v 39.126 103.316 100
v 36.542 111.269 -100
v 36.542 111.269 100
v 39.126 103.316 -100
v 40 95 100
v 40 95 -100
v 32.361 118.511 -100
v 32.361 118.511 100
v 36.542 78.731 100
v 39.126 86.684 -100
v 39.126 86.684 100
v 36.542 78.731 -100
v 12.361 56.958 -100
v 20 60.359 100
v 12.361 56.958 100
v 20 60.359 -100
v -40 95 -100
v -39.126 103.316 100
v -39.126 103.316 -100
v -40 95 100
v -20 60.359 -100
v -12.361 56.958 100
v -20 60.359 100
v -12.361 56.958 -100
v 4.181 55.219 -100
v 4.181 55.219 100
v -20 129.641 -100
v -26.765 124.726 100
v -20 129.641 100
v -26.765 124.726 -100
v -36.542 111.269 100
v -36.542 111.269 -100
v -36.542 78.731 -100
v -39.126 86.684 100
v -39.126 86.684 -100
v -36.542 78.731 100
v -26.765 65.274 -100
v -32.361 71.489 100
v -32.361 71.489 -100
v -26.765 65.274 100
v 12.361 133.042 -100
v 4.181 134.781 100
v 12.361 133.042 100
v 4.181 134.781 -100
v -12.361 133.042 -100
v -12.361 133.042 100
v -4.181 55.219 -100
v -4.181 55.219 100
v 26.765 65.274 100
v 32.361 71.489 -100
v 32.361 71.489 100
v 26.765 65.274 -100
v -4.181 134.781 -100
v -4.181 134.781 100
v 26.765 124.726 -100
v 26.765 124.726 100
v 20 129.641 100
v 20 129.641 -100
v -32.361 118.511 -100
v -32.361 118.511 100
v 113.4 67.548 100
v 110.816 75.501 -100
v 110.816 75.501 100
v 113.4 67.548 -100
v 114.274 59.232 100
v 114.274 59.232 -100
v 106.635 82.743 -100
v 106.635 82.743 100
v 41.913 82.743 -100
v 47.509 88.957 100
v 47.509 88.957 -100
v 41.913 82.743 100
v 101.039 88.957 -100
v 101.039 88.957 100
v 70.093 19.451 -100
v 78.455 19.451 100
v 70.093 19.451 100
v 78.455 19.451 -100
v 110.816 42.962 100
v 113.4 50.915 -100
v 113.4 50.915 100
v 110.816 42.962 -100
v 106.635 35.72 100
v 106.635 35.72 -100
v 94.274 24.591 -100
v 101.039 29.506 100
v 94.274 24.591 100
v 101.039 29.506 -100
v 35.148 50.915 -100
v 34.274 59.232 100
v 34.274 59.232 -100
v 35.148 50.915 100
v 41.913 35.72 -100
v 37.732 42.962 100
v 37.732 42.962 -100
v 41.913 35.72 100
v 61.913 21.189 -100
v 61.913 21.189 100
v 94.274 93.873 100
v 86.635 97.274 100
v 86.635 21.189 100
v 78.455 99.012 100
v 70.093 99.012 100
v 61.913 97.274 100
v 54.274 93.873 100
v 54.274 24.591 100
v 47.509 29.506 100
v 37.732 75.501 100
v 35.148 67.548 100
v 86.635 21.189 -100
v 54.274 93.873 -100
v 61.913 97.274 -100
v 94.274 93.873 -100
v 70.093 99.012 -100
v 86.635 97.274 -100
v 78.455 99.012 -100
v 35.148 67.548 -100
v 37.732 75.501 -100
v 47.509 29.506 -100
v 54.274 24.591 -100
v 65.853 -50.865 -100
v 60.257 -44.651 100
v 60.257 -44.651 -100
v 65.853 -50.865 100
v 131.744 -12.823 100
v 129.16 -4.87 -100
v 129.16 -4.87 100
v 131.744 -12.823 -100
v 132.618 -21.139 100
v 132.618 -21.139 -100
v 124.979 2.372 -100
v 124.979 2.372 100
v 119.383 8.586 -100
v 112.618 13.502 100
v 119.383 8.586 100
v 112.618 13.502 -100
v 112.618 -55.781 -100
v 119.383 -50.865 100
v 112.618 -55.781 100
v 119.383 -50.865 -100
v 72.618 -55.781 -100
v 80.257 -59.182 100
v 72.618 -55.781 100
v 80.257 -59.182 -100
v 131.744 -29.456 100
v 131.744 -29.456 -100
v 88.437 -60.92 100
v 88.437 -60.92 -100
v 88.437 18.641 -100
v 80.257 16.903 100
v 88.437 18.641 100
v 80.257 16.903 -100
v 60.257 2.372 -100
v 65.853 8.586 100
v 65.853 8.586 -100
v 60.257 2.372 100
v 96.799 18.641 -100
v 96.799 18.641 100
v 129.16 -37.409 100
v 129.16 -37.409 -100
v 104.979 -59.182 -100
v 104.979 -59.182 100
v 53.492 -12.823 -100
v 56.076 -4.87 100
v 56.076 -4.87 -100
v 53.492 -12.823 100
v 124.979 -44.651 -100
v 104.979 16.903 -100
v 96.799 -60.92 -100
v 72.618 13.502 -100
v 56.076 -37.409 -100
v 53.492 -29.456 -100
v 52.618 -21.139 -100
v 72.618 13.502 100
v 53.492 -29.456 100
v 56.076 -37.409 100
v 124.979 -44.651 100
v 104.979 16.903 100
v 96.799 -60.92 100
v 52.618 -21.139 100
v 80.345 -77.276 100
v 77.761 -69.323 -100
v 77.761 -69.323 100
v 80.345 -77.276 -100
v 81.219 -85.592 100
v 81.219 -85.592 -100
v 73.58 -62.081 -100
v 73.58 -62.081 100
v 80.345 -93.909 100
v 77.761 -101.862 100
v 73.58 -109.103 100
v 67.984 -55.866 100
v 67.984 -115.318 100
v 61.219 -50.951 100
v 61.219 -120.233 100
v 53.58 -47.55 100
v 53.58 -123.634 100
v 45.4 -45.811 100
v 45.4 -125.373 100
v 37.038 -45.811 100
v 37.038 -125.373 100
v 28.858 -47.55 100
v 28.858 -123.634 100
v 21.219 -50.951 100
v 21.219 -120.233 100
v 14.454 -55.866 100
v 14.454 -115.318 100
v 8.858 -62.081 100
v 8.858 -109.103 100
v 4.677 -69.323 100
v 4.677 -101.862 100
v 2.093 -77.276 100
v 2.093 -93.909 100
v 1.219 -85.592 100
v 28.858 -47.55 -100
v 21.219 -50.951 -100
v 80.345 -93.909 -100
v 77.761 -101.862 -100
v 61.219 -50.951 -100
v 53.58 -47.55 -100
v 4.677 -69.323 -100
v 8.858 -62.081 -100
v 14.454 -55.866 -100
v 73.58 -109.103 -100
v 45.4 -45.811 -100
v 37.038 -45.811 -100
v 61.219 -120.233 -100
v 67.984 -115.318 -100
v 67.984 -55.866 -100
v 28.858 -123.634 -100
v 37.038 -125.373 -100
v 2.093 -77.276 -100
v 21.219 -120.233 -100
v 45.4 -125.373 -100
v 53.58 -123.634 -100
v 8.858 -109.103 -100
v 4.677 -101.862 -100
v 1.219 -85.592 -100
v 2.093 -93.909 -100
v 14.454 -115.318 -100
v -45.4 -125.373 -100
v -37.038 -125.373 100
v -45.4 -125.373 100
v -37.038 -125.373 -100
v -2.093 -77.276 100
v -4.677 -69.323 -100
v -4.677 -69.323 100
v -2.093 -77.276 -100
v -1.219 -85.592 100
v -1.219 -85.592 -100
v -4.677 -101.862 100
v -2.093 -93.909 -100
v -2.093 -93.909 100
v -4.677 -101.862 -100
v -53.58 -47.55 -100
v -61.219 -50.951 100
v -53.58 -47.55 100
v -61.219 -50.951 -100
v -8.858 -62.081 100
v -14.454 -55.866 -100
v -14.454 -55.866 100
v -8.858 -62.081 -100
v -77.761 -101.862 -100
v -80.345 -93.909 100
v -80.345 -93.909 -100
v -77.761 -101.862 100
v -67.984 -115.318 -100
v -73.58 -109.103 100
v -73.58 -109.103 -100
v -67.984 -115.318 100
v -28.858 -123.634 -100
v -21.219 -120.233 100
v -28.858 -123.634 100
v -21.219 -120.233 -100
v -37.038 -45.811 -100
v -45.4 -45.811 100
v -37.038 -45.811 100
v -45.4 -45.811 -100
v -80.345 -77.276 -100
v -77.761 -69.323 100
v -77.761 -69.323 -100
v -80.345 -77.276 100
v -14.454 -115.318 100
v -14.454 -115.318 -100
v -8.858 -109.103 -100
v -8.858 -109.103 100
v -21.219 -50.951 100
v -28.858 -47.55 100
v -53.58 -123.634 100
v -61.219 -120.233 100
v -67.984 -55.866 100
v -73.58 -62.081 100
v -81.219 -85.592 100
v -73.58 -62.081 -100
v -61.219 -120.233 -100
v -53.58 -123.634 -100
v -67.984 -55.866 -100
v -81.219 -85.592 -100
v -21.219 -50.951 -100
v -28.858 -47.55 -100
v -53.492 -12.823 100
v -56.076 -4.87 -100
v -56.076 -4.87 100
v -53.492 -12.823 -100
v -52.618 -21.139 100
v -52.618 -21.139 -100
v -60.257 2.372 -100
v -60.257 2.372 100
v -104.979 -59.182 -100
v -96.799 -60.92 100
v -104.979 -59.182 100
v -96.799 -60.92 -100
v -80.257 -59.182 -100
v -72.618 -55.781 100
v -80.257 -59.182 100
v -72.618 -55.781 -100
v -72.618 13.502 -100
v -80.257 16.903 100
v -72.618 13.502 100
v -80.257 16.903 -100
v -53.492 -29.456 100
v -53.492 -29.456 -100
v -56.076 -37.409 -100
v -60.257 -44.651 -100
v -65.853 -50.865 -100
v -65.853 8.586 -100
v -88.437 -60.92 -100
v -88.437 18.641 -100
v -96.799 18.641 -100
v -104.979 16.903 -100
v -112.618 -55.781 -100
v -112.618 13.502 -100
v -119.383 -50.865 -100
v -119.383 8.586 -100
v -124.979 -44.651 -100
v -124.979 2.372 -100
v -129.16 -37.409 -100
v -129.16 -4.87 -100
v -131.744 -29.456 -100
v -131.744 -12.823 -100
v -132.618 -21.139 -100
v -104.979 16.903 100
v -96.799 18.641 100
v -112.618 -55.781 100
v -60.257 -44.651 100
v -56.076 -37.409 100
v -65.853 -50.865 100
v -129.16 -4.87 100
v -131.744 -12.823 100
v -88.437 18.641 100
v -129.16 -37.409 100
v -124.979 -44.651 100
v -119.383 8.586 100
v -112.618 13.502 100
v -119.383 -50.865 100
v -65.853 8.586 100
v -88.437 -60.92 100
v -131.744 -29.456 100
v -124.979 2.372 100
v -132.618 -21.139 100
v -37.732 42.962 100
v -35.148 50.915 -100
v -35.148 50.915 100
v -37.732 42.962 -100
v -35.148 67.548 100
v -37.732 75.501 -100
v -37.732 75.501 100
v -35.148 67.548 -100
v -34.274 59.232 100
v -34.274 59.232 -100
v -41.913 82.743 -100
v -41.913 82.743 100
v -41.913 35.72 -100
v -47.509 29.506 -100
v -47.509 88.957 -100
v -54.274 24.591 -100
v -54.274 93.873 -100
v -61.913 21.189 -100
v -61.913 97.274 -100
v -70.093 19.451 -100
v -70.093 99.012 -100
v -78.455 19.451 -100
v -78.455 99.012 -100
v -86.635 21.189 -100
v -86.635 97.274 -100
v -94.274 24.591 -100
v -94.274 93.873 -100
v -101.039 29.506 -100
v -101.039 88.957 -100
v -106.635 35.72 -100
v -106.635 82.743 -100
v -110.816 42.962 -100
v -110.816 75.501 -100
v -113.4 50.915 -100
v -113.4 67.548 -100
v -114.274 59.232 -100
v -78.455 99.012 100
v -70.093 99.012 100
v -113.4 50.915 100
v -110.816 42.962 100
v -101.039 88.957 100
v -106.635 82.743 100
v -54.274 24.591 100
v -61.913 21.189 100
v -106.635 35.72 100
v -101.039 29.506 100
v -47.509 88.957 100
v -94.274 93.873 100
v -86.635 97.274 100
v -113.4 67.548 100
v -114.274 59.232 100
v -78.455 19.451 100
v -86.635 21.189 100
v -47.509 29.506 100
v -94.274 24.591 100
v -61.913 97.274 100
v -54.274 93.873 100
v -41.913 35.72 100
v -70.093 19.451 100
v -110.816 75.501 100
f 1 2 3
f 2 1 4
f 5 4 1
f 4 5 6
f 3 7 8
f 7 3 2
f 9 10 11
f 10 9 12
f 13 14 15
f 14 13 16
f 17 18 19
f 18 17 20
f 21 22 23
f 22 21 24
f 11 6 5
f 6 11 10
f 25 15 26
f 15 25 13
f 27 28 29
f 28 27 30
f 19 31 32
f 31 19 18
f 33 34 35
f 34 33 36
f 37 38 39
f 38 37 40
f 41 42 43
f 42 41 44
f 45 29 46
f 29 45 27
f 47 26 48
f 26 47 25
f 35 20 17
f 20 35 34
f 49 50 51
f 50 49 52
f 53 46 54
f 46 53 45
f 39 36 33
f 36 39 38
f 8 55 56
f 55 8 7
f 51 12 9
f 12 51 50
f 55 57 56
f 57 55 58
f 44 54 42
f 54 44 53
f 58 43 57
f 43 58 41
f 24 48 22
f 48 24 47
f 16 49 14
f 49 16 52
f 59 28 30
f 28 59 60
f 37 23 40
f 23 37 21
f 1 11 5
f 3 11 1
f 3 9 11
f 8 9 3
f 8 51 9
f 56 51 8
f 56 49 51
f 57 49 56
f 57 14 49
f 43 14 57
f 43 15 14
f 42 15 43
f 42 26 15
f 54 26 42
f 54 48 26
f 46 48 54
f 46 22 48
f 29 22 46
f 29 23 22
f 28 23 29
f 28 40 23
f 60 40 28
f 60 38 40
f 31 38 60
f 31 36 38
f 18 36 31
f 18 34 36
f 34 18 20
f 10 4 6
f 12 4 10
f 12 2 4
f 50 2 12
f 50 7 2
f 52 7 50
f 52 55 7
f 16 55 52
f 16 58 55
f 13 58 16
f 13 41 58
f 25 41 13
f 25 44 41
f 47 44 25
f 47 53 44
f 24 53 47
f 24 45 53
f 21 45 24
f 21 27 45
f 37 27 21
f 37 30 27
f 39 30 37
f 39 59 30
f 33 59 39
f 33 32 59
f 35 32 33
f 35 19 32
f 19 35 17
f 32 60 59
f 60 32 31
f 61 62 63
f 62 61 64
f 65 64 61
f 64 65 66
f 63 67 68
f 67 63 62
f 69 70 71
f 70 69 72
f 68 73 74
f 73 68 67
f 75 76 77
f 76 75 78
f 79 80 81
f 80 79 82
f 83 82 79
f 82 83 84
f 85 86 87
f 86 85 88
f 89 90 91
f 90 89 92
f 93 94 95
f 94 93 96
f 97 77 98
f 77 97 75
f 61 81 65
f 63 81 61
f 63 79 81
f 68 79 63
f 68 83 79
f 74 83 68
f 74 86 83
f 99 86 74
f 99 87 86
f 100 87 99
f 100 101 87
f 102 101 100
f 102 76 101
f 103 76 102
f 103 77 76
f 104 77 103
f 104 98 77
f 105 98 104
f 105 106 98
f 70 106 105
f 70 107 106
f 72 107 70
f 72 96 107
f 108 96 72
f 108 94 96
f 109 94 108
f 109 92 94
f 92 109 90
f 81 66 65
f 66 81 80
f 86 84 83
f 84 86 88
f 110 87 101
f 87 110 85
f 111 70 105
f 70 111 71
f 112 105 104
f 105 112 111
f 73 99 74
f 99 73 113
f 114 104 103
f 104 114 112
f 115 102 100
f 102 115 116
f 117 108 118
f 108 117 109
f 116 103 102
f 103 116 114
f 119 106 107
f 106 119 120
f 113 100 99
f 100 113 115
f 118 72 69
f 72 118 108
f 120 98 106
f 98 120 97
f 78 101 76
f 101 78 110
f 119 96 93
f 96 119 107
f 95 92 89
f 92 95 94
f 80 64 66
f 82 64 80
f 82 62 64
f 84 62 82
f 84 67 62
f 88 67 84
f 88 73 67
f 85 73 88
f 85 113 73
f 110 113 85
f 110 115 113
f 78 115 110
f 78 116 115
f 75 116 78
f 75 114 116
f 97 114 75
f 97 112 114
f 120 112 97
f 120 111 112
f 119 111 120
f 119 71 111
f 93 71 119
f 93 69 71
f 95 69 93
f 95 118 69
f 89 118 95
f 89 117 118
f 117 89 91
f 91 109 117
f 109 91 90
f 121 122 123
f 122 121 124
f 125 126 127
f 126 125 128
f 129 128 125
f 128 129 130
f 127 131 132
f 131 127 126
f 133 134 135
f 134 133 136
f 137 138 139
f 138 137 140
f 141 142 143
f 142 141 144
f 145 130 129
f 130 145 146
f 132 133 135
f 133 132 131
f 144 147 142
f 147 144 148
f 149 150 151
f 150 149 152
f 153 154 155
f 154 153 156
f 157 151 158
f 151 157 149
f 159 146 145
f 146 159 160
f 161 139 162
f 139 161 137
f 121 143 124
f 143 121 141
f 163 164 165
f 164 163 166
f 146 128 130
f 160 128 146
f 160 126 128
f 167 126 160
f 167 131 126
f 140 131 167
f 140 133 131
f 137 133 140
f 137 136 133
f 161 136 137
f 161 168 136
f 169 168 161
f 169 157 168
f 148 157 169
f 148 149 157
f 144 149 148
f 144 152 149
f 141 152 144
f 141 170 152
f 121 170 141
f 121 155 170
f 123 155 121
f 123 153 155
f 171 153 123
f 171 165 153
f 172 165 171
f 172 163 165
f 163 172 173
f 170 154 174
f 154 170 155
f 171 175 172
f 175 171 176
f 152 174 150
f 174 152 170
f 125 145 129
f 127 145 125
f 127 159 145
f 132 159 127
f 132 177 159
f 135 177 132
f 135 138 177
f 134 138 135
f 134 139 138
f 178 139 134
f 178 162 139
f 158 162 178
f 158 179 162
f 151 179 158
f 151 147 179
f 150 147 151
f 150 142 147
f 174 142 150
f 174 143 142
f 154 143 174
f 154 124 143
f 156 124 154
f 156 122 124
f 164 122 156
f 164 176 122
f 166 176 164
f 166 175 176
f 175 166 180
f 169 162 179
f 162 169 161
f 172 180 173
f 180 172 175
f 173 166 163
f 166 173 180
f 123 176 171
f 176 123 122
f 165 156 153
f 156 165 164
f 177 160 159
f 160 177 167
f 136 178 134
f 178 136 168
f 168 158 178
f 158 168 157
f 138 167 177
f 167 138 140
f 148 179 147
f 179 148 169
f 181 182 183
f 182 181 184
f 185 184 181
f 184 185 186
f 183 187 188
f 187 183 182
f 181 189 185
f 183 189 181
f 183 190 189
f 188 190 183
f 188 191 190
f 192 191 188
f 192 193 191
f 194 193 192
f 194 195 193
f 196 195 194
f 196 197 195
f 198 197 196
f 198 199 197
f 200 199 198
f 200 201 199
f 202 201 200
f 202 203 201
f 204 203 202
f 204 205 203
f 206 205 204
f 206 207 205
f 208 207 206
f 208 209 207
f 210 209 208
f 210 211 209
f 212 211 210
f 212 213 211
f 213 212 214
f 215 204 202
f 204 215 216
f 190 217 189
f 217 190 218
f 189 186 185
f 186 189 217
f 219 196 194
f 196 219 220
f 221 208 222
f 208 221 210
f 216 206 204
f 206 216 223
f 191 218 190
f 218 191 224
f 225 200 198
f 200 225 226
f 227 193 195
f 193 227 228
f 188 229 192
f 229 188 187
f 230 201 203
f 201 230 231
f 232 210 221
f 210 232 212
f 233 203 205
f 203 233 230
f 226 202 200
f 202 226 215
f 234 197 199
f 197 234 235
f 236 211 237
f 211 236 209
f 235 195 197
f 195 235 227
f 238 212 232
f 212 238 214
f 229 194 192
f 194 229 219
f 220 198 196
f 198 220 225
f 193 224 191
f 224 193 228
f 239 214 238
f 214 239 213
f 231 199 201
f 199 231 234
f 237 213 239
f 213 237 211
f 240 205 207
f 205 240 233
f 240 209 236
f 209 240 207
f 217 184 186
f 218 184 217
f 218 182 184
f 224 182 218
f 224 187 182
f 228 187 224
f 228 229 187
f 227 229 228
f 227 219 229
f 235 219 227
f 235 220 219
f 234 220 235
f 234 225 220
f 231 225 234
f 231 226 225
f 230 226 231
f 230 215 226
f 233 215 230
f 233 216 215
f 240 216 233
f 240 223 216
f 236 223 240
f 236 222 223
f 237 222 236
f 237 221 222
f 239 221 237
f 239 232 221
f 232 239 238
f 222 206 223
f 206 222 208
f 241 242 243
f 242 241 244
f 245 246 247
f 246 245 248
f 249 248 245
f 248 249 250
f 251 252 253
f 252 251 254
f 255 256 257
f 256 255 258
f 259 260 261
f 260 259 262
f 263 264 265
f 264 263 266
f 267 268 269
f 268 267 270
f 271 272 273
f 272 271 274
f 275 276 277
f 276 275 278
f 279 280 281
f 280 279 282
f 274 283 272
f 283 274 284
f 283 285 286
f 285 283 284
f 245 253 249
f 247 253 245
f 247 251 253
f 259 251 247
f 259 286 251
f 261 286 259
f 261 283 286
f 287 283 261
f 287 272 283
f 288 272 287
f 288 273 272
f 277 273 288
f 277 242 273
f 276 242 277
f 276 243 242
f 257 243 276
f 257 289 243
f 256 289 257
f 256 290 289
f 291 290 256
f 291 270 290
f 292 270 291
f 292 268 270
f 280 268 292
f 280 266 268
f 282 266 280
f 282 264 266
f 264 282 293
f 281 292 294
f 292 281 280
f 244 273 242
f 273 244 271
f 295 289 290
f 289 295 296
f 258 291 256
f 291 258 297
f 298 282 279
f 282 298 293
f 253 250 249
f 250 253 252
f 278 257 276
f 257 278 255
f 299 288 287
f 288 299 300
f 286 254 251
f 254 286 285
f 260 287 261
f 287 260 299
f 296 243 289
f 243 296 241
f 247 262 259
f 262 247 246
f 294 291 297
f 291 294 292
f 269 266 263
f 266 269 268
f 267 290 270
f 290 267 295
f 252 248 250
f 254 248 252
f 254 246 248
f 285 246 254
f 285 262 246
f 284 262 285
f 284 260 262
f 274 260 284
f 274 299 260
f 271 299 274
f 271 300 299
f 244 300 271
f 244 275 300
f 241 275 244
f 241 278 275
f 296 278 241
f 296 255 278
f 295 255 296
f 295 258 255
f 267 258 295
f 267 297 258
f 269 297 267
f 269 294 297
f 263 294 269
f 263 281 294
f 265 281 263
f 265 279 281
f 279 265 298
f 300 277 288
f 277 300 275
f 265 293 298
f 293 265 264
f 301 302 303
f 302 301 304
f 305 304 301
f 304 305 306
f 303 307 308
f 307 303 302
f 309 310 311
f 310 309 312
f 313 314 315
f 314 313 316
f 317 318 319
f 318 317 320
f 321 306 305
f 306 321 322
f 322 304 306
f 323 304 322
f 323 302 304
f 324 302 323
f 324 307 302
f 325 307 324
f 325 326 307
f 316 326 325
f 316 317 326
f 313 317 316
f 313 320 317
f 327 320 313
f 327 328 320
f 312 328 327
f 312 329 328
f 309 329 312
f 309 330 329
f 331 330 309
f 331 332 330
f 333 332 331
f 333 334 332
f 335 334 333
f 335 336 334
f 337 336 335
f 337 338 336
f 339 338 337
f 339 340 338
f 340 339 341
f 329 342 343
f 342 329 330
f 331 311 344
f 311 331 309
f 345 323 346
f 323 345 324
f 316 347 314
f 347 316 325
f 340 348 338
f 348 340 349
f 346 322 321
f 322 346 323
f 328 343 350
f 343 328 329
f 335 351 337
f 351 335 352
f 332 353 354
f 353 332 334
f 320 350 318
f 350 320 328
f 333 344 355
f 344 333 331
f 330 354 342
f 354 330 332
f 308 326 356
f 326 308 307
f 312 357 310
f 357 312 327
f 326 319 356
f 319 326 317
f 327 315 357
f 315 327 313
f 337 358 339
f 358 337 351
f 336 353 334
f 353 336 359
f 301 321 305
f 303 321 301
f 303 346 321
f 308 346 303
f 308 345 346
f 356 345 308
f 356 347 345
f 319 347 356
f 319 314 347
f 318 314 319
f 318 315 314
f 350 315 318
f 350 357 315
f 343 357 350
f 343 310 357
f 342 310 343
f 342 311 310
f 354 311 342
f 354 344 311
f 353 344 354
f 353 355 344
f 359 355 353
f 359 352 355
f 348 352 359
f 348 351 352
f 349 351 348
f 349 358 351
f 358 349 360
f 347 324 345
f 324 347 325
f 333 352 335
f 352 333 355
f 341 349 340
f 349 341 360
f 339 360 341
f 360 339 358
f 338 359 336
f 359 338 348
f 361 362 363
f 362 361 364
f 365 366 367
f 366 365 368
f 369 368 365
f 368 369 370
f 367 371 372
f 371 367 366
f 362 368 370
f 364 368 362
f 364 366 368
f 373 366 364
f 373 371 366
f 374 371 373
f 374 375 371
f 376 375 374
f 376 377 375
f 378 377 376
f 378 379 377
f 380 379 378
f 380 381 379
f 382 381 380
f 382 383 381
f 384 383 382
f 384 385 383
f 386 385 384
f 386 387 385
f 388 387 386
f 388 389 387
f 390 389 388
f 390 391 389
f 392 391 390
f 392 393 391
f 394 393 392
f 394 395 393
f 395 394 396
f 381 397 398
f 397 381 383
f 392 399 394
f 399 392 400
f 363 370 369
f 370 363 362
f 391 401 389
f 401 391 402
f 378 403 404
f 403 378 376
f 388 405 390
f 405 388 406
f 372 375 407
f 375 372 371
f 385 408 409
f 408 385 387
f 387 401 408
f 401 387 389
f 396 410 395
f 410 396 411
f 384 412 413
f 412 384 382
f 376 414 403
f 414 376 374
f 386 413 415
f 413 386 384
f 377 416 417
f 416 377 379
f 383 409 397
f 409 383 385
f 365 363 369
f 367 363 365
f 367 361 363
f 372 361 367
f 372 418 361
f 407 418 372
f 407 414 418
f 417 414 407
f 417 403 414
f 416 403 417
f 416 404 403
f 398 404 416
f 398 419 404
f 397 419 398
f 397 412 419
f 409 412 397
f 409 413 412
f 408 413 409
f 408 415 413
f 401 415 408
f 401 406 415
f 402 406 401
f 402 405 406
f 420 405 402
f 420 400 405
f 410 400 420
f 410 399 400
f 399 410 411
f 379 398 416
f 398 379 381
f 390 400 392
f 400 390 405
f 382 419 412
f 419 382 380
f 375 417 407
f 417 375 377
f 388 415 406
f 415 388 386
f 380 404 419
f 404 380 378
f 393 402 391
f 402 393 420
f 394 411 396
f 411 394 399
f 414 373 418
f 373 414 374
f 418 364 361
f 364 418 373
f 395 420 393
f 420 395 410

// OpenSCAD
// file: variables.scad
// Pinya3 3D Food Printer
// file: variables.scad 
// author: Luis Rodriguez
// version: 0.1
// w3b: 3digitalcooks.com 

// Variables for all the project
// just numbers??
alpha = 0.7;

// FRAME 
frame_alpha = alpha;
frame_profile_width = 30;

frame_height = 500;
frame_width = 250;  // 250mm -> 7capsules~de 8cm
frame_lenght = 250;

// DELTA BEAM
delta_beam_alpha = alpha;
delta_beam_length = 700;
delta_beam_profile_width = 100;
delta_beam_under_frame = 1; // 1 = Beam under frame or 0 = Beam on frame

// CAROUSEL
carousel_alpha = 0.3;
carousel_number_of_tools = 7;
carousel_offset_rotation = 0; // in degrees
carousel_rad = frame_width/2 - 30;//160;
carousel_tool_height = 200;
carousel_tool_rad = 40;
// main file
// Pinya3 3D Food Printer
// file: carousel.scad 
// author: Luis Rodriguez
// version: 0.1
// w3b: 3digitalcooks.com

include <variables.scad>

carousel();

module carousel(){
  difference(){
    union(){ // Add
      tools();
      }
    union(){ // Substract
      }
  }
}

module tools() {
  for (i = [0+carousel_offset_rotation:(360/carousel_number_of_tools):360+carousel_offset_rotation]) {
    translate([carousel_rad*sin(i), carousel_rad*cos(i), 0])
      tool();
  }
}

module tool() {
  color("Red", carousel_alpha)
  cylinder(h = carousel_tool_height, r = carousel_tool_rad, center=true);
}
